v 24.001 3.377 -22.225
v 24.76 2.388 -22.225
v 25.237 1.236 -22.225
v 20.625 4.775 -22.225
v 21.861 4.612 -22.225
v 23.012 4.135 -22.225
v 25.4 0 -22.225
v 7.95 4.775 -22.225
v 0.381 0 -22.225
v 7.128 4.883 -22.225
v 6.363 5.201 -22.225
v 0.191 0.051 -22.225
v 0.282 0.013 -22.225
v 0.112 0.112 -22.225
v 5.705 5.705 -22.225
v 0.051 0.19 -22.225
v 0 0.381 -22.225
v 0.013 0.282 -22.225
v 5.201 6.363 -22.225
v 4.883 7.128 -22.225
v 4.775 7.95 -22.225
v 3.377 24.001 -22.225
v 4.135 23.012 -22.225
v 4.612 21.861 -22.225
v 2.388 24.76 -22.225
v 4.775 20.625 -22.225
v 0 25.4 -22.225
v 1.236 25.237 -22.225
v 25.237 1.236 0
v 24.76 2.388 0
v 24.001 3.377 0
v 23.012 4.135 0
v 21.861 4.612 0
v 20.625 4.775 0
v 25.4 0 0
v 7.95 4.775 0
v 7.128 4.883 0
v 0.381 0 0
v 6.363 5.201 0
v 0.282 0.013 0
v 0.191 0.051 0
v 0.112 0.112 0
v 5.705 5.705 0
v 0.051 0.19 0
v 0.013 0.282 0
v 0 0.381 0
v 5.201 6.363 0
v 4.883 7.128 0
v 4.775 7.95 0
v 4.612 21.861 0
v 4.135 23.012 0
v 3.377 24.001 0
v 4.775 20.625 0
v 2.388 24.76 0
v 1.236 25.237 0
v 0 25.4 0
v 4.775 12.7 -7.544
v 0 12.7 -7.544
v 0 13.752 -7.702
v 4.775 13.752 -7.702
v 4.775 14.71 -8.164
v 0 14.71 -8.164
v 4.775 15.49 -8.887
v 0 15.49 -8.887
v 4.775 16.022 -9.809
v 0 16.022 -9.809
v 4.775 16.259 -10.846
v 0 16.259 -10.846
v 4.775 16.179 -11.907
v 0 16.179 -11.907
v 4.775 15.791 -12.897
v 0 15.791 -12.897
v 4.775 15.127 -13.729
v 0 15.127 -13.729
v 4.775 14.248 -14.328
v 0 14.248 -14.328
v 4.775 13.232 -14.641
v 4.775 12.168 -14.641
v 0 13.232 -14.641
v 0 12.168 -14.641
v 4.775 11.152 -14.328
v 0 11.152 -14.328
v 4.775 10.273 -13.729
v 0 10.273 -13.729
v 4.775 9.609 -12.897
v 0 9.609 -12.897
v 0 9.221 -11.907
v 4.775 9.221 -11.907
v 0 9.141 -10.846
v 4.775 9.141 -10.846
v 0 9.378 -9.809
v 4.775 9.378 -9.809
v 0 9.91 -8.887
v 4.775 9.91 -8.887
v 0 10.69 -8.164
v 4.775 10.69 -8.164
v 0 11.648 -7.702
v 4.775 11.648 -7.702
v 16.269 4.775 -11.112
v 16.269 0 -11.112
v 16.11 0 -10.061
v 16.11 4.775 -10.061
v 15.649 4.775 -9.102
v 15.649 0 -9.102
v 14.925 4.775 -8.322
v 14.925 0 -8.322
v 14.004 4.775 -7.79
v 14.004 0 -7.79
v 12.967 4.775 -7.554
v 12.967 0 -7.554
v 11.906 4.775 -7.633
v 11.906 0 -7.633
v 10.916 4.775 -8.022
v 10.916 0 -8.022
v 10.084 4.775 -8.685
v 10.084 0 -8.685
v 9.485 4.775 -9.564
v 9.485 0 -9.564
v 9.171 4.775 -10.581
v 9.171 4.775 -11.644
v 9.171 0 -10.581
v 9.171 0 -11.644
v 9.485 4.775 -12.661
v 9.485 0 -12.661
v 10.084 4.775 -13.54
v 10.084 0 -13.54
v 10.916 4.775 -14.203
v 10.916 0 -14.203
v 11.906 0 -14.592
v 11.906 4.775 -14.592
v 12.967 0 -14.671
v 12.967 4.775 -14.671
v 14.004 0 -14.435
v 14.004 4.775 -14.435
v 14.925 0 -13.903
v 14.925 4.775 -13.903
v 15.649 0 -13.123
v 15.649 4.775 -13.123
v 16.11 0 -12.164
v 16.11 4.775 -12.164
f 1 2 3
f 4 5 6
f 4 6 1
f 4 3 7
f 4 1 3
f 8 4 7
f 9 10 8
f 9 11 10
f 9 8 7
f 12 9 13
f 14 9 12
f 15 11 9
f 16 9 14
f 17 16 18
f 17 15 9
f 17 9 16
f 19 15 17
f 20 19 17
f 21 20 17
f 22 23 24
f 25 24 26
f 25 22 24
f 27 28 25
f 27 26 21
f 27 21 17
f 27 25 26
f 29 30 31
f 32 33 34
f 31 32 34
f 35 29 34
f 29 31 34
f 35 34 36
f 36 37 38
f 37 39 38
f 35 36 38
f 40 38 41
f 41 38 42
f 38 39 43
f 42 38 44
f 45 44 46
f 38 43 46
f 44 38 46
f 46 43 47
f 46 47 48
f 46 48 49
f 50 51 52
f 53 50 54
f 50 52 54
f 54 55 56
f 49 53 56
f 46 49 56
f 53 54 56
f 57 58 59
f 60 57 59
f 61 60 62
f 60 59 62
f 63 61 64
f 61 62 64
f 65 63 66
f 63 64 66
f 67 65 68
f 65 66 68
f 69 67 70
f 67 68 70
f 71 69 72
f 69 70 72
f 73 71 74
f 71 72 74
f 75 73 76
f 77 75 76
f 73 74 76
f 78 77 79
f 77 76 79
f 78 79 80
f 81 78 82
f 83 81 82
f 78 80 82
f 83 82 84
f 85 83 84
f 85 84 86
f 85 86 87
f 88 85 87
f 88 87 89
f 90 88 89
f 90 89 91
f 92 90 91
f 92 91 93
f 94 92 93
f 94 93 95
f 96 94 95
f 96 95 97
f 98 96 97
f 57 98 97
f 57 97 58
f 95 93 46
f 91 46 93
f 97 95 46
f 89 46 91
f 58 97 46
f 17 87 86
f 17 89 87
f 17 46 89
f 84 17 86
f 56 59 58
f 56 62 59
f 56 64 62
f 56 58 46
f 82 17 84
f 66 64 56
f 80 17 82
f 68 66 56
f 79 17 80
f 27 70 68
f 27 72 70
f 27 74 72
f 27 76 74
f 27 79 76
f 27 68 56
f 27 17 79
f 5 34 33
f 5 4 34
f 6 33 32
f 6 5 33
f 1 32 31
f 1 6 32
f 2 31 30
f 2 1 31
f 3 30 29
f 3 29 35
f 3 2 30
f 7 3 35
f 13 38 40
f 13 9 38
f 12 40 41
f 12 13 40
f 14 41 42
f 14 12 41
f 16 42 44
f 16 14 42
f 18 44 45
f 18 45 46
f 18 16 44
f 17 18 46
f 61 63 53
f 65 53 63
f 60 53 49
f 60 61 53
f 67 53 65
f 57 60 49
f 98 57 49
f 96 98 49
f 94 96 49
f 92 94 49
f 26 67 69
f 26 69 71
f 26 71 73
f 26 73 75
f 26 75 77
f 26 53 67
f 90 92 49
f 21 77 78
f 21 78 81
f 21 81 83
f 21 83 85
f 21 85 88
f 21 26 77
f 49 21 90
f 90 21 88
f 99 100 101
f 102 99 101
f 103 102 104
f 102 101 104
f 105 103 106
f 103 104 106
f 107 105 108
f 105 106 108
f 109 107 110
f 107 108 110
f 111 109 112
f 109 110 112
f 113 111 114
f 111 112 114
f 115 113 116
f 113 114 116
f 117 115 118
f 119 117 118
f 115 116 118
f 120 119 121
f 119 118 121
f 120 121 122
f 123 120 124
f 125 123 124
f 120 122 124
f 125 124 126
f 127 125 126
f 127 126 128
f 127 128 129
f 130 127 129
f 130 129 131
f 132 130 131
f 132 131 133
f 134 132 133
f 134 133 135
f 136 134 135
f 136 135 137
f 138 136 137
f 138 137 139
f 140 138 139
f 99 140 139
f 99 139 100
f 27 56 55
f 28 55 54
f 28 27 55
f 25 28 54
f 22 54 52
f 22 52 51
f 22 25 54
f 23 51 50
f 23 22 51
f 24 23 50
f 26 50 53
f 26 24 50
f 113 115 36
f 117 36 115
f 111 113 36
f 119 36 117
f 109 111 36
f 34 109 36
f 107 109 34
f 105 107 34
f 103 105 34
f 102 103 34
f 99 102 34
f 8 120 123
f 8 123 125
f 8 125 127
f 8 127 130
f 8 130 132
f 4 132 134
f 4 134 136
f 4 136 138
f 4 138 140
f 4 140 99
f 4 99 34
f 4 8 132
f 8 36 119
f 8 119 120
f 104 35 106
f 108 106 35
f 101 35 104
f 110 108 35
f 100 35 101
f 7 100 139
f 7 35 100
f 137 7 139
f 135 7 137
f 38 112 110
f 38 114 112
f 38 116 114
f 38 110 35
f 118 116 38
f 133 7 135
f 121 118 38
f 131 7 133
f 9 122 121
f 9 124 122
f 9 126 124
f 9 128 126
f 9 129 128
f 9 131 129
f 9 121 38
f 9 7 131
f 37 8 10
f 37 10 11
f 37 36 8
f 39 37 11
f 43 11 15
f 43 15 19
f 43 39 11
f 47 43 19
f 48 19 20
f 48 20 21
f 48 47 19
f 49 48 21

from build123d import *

# Parameters (mm, degrees)
BOSS_EXTRUDE1_DEPTH = 11.1125
HOLE1_D             = 7.1374
HOLE2_D             = 7.1374
FILLET1_R           = 0.381
FILLET2_R           = 3.175


with BuildPart() as part:
    # Sketch1 → Boss-Extrude1 (new, symmetric)
    with BuildSketch(Plane(origin=(0, 0, -11.1125), x_dir=(-1, 0, 0), z_dir=(0, 0, -1))):
        with BuildLine():
            Line((-25.4, 0), (0, 0))
            Line((0, 0), (0, 25.4))
            ThreePointArc((0, 25.4), (-3.376576302, 24.001376301), (-4.7752, 20.6248))
            Line((-4.7752, 20.6248), (-4.7752, 4.7752))
            Line((-4.7752, 4.7752), (-20.6248, 4.7752))
            ThreePointArc((-20.6248, 4.7752), (-24.001376302, 3.376576301), (-25.4, 0))
        make_face()
    extrude(amount=BOSS_EXTRUDE1_DEPTH, both=True)

    # Hole1 (through all)
    with Locations(Plane(origin=(0, 4.7752, 0), x_dir=(-1, 0, 0), z_dir=(0, 1, 0))):
        with Locations((-12.7, -11.1125)):
            Hole(HOLE1_D / 2)

    # Hole2 (through all)
    with Locations(Plane(origin=(4.7752, 0, 0), x_dir=(0, 0, -1), z_dir=(1, 0, 0))):
        with Locations((11.1125, 12.7)):
            Hole(HOLE2_D / 2)

    # Fillet1
    fillet1_edges = [part.edges().sort_by_distance(p)[0] for p in [
        (0, 0, -11.1125),
    ]]
    fillet(fillet1_edges, radius=FILLET1_R)

    # Fillet2
    fillet2_edges = [part.edges().sort_by_distance(p)[0] for p in [
        (4.7752, 4.7752, -11.1125),
    ]]
    fillet(fillet2_edges, radius=FILLET2_R)


solid = part.part
